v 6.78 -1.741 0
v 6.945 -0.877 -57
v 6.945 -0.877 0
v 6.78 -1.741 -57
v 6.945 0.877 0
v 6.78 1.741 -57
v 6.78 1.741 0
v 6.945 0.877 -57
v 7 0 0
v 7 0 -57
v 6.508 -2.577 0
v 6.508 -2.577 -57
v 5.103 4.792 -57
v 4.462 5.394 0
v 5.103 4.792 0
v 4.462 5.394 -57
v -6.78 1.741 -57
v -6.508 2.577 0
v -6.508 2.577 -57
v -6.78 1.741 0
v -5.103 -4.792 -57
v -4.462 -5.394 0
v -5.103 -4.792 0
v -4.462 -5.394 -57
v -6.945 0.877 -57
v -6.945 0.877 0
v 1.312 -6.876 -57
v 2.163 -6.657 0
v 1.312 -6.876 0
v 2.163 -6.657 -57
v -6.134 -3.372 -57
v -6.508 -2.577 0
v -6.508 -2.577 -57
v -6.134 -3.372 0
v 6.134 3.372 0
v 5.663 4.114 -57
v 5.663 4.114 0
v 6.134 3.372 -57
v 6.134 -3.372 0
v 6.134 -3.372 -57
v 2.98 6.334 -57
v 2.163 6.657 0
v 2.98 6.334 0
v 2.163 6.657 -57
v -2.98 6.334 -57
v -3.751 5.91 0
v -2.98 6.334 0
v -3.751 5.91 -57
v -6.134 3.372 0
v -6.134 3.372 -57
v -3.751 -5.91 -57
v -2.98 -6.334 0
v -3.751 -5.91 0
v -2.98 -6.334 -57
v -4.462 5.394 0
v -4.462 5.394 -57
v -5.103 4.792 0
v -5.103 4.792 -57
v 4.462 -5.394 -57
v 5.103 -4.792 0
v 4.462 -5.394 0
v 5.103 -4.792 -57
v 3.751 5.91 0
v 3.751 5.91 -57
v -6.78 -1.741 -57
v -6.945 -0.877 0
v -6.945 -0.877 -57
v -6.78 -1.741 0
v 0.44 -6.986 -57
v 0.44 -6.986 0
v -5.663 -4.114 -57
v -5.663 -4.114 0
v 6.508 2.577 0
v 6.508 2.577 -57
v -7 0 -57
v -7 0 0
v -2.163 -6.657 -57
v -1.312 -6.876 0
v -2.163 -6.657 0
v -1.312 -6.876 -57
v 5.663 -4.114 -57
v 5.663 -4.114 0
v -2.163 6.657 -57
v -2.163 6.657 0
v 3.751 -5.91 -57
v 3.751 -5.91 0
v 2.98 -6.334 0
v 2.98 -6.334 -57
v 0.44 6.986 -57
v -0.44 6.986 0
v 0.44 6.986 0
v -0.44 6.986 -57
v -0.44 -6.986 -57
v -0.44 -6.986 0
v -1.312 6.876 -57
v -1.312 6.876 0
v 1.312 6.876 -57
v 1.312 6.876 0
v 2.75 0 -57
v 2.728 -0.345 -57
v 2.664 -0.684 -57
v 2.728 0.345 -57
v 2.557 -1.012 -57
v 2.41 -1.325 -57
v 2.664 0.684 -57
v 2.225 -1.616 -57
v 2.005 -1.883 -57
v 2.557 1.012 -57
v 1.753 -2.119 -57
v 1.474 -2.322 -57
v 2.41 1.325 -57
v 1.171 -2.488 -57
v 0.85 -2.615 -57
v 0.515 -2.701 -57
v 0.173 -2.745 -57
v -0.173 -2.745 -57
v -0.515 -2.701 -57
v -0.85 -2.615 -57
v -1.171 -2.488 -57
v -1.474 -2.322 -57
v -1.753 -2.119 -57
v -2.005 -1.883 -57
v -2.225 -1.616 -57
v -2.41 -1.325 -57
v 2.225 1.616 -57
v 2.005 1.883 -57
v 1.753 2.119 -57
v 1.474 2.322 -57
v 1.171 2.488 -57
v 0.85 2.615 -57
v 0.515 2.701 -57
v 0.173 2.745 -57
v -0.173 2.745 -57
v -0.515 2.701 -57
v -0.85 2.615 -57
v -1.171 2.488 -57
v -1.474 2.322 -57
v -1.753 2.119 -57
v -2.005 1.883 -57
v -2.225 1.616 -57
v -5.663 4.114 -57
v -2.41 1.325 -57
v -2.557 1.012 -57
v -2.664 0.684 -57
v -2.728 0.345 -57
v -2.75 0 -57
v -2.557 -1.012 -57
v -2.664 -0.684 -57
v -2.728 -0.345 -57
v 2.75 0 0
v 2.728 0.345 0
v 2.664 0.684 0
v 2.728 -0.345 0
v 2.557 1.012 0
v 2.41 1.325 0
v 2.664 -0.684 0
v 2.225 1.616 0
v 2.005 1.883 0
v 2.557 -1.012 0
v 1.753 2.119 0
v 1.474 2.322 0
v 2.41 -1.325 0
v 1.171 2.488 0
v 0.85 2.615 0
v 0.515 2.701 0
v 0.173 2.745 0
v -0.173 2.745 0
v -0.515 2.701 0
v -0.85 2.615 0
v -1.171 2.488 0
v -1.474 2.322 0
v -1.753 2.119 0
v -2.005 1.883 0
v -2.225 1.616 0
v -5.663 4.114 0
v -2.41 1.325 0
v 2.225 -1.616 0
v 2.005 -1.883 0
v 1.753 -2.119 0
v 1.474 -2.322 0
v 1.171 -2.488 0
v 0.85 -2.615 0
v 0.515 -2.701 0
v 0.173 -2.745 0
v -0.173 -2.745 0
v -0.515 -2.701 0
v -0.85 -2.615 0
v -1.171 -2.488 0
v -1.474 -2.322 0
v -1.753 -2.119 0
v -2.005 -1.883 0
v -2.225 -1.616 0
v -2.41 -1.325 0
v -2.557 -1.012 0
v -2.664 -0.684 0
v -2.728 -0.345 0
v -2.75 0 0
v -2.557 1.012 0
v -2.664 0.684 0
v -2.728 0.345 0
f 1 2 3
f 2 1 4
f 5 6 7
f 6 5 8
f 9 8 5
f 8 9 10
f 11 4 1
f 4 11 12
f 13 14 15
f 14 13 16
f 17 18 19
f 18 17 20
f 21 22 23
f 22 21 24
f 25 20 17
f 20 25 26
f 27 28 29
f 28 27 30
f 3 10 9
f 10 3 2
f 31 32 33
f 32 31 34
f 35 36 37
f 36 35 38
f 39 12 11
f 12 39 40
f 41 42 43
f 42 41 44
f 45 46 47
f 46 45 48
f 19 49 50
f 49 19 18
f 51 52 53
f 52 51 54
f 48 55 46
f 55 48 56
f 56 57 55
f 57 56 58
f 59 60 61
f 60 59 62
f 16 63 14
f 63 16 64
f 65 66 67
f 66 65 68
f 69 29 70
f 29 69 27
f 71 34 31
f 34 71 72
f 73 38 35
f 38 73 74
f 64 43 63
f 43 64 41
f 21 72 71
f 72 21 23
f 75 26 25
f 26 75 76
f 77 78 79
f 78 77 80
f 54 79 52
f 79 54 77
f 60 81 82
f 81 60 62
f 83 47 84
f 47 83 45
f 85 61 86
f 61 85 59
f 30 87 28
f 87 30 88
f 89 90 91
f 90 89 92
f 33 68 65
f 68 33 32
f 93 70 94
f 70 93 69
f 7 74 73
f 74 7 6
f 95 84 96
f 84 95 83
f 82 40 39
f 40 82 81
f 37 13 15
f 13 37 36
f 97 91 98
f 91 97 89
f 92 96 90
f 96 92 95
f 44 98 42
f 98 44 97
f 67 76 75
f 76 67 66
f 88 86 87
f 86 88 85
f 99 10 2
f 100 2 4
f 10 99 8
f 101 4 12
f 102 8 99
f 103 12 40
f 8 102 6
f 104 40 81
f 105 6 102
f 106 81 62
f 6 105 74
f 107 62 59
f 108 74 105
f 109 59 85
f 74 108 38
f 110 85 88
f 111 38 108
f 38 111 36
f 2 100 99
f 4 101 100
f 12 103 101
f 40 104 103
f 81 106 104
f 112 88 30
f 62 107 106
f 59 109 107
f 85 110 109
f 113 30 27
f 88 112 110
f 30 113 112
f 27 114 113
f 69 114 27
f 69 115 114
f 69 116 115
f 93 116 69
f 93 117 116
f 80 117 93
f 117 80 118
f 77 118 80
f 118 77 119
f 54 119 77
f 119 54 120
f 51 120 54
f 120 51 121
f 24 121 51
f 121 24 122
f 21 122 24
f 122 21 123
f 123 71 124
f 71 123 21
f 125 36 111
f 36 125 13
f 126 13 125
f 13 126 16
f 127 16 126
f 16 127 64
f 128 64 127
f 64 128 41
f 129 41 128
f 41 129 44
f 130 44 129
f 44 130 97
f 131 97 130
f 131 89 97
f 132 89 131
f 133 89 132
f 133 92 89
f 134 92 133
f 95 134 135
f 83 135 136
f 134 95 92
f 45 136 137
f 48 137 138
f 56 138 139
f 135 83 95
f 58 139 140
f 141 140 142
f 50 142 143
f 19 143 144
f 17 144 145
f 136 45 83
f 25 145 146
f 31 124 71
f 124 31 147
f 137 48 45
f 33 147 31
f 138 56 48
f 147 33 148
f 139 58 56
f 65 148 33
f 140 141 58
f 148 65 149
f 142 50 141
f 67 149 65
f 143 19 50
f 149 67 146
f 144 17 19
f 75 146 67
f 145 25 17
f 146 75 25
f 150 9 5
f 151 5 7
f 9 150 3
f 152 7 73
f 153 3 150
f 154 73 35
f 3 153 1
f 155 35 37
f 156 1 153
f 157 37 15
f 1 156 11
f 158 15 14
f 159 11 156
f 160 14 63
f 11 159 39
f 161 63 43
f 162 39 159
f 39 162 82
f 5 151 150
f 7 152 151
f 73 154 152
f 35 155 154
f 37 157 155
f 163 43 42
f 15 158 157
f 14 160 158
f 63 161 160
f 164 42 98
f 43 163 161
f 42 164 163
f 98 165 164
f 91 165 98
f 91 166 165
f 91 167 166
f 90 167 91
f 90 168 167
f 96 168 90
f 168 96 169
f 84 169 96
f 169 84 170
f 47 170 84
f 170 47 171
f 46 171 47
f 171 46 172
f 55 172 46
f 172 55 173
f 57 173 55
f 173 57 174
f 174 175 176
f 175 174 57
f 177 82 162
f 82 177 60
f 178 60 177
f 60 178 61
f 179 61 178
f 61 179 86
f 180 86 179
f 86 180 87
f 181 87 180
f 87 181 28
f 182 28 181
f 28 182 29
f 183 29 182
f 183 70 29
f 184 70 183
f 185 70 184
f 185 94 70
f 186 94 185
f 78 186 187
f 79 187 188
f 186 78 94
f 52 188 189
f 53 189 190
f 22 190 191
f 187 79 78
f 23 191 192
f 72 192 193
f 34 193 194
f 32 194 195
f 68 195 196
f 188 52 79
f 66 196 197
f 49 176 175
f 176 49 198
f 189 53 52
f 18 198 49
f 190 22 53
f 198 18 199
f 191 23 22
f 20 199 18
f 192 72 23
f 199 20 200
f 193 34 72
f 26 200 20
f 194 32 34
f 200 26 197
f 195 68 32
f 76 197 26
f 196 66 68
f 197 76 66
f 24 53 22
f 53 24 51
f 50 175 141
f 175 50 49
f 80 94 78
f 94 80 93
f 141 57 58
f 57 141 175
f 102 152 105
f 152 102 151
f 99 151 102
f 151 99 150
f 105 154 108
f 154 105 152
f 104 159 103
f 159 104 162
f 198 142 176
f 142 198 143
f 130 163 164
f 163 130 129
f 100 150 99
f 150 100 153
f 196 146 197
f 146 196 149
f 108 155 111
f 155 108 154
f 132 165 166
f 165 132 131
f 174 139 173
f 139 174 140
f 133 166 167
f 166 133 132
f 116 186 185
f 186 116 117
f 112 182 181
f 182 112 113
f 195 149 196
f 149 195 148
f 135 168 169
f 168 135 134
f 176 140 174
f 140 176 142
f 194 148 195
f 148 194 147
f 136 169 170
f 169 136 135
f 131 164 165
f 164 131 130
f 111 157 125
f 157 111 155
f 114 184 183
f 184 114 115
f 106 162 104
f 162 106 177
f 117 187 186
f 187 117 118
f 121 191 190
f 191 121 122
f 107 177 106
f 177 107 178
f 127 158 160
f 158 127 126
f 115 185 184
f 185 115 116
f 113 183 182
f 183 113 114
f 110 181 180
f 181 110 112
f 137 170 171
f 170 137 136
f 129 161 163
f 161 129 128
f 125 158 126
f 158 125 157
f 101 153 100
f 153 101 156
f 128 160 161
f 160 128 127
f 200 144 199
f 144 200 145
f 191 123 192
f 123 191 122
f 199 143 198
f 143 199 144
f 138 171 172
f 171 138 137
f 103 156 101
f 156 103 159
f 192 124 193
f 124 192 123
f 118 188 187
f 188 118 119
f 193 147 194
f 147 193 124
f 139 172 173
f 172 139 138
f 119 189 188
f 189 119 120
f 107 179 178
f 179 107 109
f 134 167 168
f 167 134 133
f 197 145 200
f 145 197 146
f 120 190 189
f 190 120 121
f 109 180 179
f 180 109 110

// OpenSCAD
$fn = 50;


difference() {
	union() {
		translate(v = [0, 0, -57.0000000000]) {
			cylinder(h = 57, r = 7.0000000000);
		}
	}
	union() {
		#translate(v = [0, 0, -57]) {
			cylinder(h = 57, r = 2.7500000000);
		}
	}
}
